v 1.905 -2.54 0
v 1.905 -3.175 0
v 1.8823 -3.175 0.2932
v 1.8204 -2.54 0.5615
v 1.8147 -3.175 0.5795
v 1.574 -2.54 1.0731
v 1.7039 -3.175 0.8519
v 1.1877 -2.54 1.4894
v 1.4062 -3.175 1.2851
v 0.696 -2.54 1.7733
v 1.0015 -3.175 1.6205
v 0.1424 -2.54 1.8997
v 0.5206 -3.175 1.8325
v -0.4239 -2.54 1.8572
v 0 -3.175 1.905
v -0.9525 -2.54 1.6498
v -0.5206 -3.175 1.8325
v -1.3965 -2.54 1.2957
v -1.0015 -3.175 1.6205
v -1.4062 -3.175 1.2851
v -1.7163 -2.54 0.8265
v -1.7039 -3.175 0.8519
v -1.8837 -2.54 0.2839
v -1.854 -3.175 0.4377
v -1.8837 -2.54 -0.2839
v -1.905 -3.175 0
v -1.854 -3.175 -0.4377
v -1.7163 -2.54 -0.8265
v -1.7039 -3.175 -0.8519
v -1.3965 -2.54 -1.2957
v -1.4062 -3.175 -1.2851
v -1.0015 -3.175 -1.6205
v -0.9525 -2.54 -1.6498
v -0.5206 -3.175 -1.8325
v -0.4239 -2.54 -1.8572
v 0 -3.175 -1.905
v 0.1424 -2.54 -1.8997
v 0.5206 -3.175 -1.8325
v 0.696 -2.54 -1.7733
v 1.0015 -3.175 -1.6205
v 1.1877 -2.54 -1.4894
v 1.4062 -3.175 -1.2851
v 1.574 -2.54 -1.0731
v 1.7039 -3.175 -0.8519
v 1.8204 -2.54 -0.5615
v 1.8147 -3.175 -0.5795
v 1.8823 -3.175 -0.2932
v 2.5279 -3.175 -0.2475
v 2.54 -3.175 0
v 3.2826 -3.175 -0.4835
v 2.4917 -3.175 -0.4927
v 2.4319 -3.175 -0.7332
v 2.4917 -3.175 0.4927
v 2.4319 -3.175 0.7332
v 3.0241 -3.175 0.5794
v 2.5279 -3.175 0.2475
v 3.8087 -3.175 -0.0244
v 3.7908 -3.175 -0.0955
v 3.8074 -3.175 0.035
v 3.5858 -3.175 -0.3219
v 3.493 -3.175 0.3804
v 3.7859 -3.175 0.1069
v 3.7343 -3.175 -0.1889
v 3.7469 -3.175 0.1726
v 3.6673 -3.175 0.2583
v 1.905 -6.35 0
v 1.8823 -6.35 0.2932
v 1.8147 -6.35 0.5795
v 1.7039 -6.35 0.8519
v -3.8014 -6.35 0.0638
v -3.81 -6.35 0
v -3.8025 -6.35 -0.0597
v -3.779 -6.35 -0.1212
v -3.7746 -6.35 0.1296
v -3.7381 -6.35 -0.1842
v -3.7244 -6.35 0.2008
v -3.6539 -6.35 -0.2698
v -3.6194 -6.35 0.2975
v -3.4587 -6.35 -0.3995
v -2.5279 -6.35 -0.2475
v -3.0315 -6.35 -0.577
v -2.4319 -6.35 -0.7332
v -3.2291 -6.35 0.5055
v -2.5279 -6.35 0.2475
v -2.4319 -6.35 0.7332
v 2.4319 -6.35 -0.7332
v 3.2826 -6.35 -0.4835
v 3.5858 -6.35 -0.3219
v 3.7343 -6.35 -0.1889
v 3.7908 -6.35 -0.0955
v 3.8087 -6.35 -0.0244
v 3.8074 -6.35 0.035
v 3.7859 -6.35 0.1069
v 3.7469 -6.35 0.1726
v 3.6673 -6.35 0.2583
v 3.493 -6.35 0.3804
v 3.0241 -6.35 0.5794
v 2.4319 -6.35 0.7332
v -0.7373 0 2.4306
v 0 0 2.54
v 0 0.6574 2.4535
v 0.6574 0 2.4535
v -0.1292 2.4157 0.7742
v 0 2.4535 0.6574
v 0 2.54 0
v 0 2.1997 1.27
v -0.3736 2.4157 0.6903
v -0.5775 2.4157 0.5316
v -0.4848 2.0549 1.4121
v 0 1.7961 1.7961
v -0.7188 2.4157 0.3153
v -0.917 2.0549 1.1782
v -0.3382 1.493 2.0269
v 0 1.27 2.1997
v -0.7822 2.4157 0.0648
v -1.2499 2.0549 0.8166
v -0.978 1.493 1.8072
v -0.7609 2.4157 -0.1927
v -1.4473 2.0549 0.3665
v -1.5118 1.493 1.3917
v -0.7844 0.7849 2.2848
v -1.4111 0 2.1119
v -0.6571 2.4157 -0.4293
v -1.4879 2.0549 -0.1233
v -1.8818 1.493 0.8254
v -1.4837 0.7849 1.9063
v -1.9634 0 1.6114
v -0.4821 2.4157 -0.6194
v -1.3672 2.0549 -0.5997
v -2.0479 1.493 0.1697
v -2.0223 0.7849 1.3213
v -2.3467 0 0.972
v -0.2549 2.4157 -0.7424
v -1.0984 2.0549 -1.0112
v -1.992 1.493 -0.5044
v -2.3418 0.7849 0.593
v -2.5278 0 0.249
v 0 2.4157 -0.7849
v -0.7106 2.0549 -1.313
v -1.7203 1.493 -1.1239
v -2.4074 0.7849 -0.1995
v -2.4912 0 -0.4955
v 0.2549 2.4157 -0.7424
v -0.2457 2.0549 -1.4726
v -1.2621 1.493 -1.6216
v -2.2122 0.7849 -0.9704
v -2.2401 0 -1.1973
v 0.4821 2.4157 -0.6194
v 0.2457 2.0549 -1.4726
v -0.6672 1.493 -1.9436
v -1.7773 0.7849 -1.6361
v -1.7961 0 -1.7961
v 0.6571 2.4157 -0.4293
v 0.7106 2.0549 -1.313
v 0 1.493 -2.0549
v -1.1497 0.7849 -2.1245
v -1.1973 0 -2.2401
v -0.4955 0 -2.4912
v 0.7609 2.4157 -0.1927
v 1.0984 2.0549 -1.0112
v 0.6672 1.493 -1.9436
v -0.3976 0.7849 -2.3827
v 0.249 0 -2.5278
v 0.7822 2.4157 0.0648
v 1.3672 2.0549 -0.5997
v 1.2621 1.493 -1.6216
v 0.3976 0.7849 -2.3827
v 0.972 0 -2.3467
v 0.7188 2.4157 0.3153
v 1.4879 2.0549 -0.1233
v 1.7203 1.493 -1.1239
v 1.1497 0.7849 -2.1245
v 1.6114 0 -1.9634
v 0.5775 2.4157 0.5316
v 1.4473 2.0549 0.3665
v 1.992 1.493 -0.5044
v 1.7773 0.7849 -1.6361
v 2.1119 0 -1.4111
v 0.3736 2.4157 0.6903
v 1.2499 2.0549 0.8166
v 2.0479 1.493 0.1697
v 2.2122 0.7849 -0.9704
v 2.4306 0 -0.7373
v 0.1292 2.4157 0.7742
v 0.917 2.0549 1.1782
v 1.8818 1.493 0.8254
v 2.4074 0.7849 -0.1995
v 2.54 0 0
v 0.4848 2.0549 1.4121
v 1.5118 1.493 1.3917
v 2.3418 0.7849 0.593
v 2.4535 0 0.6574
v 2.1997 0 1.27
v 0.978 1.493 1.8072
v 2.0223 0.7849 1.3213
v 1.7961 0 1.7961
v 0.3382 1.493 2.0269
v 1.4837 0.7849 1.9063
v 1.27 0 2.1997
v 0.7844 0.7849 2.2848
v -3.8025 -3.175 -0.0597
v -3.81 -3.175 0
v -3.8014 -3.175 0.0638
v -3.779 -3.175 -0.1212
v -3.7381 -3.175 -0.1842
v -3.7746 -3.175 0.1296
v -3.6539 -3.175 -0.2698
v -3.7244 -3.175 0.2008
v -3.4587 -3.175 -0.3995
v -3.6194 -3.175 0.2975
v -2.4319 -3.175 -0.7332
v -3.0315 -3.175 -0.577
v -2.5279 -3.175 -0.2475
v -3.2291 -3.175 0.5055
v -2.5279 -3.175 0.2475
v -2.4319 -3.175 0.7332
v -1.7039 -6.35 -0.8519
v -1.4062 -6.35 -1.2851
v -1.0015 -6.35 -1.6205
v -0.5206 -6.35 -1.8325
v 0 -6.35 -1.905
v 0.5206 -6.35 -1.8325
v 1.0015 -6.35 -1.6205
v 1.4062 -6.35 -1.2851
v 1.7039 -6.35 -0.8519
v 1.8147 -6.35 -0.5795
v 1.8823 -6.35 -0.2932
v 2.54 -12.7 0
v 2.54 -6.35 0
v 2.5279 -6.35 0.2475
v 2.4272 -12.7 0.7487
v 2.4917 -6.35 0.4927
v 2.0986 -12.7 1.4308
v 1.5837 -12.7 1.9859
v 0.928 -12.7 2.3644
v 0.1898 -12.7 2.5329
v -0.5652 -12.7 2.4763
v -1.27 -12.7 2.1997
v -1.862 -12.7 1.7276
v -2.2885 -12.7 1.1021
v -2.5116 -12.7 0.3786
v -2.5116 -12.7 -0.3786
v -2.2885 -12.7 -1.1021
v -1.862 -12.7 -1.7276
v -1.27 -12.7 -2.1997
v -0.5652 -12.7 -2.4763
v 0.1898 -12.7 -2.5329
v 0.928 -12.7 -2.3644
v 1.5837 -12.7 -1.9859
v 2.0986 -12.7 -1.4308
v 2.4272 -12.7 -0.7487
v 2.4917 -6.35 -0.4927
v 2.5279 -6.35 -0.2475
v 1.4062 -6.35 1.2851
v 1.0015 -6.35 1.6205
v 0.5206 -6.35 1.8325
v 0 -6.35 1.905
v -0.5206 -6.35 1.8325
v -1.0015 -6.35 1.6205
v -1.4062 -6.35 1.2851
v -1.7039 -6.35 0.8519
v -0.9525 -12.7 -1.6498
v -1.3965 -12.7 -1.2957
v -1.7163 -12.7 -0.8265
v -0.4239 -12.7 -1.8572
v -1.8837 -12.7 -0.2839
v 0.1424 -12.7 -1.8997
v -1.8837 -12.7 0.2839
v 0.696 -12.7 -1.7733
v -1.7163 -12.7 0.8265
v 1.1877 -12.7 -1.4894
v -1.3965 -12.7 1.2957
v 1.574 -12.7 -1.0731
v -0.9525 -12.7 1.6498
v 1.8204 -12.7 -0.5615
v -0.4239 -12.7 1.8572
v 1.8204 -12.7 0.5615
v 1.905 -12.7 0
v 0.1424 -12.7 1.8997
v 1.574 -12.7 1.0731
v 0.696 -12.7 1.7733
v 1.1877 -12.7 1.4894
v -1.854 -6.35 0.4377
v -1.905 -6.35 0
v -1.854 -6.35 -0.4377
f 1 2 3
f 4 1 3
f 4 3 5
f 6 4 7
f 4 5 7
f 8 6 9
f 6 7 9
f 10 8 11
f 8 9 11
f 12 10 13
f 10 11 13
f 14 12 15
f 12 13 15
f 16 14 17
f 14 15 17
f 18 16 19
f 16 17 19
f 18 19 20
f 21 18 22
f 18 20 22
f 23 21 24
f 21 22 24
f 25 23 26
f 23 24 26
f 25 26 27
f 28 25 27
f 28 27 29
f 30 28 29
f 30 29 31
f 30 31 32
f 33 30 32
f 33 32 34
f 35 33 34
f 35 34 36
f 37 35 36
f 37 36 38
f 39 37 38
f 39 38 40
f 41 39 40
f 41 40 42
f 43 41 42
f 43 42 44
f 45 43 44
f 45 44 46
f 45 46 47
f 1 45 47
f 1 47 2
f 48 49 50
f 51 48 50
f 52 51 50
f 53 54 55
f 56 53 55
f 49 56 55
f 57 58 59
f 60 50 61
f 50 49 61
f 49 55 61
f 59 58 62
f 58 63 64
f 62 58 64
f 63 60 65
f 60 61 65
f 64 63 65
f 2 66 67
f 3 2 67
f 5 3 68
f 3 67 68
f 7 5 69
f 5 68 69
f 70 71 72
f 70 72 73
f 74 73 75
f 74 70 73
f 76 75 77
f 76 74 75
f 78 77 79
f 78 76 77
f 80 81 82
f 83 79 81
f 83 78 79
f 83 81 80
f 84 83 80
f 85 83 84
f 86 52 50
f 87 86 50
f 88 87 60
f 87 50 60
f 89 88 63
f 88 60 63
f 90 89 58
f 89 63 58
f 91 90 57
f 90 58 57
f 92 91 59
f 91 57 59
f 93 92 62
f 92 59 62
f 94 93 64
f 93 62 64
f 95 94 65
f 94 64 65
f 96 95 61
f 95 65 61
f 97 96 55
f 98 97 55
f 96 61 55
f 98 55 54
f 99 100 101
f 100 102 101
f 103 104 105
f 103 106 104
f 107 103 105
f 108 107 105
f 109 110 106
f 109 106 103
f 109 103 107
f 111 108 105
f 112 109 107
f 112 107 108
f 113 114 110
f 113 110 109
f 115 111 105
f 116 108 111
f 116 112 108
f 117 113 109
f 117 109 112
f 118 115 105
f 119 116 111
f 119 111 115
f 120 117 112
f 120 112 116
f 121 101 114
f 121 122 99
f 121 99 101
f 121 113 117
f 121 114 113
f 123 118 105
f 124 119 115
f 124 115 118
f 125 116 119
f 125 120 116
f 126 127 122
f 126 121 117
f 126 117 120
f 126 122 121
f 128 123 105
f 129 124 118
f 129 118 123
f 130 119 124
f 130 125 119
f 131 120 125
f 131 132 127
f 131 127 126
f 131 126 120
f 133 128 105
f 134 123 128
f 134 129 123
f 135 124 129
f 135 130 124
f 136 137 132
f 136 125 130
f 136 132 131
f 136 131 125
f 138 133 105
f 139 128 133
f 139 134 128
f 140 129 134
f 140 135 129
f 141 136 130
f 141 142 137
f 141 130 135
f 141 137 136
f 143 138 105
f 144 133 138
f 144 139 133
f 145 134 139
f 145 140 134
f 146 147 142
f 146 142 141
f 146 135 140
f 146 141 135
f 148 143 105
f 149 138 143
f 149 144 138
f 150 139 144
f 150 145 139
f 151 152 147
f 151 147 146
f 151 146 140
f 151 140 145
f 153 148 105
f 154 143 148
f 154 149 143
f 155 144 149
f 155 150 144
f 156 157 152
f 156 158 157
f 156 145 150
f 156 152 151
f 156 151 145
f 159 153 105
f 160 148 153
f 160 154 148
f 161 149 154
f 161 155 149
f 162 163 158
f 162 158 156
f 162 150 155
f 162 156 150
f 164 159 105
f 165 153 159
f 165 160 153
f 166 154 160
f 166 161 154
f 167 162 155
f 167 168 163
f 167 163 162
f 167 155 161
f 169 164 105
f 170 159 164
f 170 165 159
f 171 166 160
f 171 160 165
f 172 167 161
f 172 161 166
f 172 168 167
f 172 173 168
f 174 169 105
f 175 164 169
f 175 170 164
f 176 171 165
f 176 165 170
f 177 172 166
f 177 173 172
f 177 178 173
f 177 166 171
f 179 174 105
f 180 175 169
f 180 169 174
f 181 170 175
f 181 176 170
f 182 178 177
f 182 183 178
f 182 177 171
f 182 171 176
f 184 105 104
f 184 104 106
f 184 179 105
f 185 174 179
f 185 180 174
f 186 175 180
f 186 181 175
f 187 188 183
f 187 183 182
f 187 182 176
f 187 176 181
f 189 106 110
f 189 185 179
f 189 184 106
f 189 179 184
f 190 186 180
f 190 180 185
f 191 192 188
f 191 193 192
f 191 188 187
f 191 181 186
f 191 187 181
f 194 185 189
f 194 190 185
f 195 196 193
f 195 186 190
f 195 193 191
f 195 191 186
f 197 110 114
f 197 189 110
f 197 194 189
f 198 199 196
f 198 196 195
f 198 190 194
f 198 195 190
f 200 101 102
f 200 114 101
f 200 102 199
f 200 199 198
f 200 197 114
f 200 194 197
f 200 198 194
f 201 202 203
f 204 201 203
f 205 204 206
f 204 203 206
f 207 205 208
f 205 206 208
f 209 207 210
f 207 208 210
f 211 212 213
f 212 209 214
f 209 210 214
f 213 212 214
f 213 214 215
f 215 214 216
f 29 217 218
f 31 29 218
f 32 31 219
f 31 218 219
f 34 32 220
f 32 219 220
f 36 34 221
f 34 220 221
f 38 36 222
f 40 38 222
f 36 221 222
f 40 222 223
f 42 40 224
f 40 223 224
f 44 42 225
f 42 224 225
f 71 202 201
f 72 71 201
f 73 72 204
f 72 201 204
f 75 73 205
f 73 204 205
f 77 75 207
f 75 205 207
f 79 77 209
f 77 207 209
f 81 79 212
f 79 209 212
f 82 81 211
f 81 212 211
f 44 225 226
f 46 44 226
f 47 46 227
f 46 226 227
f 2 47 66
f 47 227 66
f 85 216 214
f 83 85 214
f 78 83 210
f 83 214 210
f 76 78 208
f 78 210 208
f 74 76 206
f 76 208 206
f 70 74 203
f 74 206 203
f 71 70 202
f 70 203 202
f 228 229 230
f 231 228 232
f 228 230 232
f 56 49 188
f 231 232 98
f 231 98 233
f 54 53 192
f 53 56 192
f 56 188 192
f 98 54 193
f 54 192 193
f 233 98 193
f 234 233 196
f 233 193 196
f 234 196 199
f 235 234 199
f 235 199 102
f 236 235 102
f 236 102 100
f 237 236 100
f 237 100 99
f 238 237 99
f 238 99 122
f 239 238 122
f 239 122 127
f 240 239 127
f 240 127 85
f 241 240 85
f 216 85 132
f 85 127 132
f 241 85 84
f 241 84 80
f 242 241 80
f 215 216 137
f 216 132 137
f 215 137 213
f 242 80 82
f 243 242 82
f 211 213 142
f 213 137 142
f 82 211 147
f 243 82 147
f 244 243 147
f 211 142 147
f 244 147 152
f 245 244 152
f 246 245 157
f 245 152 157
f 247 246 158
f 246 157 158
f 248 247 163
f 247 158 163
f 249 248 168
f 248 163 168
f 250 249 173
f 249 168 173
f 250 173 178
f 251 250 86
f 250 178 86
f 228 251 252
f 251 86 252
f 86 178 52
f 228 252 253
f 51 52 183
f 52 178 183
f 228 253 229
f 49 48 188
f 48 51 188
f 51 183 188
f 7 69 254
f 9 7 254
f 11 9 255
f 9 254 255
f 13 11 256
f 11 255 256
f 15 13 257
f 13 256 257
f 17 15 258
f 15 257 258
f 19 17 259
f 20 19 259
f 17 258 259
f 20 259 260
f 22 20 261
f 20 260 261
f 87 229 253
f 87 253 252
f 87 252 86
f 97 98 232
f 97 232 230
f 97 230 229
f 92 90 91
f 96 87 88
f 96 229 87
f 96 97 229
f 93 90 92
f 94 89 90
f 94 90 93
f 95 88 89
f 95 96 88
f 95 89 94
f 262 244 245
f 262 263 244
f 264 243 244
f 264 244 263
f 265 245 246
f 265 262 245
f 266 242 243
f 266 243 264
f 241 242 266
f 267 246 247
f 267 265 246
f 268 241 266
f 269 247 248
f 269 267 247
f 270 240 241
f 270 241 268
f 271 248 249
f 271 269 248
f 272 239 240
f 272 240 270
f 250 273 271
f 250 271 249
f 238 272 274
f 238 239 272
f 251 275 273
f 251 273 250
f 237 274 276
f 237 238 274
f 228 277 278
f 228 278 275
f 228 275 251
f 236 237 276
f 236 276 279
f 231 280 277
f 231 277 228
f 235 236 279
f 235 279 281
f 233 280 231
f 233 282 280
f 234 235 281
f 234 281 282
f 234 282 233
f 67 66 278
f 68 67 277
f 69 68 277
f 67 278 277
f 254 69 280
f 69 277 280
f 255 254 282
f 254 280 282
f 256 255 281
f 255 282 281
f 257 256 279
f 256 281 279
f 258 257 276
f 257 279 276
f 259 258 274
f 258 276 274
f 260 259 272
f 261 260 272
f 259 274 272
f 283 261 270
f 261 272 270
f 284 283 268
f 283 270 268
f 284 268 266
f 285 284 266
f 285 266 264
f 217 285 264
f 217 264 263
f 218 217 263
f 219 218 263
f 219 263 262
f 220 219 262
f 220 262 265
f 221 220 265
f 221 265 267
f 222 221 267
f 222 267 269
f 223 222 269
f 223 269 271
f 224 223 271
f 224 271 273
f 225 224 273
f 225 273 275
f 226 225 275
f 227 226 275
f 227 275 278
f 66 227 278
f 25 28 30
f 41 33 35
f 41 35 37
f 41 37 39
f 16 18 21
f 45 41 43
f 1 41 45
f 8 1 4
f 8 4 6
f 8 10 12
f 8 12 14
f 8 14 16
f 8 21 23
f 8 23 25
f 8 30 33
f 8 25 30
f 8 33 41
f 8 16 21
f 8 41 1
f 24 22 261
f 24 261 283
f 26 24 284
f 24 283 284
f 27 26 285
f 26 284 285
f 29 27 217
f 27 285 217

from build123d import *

# Parameters (mm, degrees)
F1_R      = 2.54
F2_DEPTH  = 12.7
F3_R      = 1.905
F4_DEPTH  = 10.16
F10_DEPTH = 3.175
F11_R     = 1.905
F12_DEPTH = 3.175


with BuildPart() as f2:
    # F1 (on Front) → F2 (new body)
    with BuildSketch(Plane.XZ):
        Circle(F1_R)
    extrude(amount=F2_DEPTH)

    # F3 (on face) → F4 (cut)
    with BuildSketch(Plane.XZ.offset(12.7)):
        Circle(F3_R)
    extrude(amount=-F4_DEPTH, mode=Mode.SUBTRACT)

    # F5 (on Right) → F7 (revolve)
    with BuildSketch(Plane.YZ):
        with BuildLine():
            ThreePointArc((2.54, 0), (1.7960512242, 1.7960512242), (0, 2.54))
            Line((0, 2.54), (0, 0))
            Line((0, 0), (2.54, 0))
        make_face()
    revolve(axis=Axis((0, 0.1524034305, 0), (0, -1, 0)))

    # F9 (on offset) → F10 (join)
    with BuildSketch(Plane.XZ.offset(3.175)):
        with BuildLine():
            add(Edge.make_bspline(
                [(-3.81, 0), (-3.81, -1.6497783942), (1.905, -0.8248891971), (7.62, 0), (1.905, 0.8248891971), (-3.81, 1.6497783942), (-3.81, 0)],
                knots=[0, 0, 0, 2.0943951024, 2.0943951024, 4.1887902048, 4.1887902048, 6.2831853072, 6.2831853072, 6.2831853072], degree=2, weights=[1, 0.5, 1, 0.5, 1, 0.5, 1]))
        make_face()
    extrude(amount=F10_DEPTH)

    # F11 (on face) → F12 (cut)
    with BuildSketch(Plane.XZ.offset(6.35)):
        Circle(F11_R)
    extrude(amount=-F12_DEPTH, mode=Mode.SUBTRACT)


solid = f2.part
